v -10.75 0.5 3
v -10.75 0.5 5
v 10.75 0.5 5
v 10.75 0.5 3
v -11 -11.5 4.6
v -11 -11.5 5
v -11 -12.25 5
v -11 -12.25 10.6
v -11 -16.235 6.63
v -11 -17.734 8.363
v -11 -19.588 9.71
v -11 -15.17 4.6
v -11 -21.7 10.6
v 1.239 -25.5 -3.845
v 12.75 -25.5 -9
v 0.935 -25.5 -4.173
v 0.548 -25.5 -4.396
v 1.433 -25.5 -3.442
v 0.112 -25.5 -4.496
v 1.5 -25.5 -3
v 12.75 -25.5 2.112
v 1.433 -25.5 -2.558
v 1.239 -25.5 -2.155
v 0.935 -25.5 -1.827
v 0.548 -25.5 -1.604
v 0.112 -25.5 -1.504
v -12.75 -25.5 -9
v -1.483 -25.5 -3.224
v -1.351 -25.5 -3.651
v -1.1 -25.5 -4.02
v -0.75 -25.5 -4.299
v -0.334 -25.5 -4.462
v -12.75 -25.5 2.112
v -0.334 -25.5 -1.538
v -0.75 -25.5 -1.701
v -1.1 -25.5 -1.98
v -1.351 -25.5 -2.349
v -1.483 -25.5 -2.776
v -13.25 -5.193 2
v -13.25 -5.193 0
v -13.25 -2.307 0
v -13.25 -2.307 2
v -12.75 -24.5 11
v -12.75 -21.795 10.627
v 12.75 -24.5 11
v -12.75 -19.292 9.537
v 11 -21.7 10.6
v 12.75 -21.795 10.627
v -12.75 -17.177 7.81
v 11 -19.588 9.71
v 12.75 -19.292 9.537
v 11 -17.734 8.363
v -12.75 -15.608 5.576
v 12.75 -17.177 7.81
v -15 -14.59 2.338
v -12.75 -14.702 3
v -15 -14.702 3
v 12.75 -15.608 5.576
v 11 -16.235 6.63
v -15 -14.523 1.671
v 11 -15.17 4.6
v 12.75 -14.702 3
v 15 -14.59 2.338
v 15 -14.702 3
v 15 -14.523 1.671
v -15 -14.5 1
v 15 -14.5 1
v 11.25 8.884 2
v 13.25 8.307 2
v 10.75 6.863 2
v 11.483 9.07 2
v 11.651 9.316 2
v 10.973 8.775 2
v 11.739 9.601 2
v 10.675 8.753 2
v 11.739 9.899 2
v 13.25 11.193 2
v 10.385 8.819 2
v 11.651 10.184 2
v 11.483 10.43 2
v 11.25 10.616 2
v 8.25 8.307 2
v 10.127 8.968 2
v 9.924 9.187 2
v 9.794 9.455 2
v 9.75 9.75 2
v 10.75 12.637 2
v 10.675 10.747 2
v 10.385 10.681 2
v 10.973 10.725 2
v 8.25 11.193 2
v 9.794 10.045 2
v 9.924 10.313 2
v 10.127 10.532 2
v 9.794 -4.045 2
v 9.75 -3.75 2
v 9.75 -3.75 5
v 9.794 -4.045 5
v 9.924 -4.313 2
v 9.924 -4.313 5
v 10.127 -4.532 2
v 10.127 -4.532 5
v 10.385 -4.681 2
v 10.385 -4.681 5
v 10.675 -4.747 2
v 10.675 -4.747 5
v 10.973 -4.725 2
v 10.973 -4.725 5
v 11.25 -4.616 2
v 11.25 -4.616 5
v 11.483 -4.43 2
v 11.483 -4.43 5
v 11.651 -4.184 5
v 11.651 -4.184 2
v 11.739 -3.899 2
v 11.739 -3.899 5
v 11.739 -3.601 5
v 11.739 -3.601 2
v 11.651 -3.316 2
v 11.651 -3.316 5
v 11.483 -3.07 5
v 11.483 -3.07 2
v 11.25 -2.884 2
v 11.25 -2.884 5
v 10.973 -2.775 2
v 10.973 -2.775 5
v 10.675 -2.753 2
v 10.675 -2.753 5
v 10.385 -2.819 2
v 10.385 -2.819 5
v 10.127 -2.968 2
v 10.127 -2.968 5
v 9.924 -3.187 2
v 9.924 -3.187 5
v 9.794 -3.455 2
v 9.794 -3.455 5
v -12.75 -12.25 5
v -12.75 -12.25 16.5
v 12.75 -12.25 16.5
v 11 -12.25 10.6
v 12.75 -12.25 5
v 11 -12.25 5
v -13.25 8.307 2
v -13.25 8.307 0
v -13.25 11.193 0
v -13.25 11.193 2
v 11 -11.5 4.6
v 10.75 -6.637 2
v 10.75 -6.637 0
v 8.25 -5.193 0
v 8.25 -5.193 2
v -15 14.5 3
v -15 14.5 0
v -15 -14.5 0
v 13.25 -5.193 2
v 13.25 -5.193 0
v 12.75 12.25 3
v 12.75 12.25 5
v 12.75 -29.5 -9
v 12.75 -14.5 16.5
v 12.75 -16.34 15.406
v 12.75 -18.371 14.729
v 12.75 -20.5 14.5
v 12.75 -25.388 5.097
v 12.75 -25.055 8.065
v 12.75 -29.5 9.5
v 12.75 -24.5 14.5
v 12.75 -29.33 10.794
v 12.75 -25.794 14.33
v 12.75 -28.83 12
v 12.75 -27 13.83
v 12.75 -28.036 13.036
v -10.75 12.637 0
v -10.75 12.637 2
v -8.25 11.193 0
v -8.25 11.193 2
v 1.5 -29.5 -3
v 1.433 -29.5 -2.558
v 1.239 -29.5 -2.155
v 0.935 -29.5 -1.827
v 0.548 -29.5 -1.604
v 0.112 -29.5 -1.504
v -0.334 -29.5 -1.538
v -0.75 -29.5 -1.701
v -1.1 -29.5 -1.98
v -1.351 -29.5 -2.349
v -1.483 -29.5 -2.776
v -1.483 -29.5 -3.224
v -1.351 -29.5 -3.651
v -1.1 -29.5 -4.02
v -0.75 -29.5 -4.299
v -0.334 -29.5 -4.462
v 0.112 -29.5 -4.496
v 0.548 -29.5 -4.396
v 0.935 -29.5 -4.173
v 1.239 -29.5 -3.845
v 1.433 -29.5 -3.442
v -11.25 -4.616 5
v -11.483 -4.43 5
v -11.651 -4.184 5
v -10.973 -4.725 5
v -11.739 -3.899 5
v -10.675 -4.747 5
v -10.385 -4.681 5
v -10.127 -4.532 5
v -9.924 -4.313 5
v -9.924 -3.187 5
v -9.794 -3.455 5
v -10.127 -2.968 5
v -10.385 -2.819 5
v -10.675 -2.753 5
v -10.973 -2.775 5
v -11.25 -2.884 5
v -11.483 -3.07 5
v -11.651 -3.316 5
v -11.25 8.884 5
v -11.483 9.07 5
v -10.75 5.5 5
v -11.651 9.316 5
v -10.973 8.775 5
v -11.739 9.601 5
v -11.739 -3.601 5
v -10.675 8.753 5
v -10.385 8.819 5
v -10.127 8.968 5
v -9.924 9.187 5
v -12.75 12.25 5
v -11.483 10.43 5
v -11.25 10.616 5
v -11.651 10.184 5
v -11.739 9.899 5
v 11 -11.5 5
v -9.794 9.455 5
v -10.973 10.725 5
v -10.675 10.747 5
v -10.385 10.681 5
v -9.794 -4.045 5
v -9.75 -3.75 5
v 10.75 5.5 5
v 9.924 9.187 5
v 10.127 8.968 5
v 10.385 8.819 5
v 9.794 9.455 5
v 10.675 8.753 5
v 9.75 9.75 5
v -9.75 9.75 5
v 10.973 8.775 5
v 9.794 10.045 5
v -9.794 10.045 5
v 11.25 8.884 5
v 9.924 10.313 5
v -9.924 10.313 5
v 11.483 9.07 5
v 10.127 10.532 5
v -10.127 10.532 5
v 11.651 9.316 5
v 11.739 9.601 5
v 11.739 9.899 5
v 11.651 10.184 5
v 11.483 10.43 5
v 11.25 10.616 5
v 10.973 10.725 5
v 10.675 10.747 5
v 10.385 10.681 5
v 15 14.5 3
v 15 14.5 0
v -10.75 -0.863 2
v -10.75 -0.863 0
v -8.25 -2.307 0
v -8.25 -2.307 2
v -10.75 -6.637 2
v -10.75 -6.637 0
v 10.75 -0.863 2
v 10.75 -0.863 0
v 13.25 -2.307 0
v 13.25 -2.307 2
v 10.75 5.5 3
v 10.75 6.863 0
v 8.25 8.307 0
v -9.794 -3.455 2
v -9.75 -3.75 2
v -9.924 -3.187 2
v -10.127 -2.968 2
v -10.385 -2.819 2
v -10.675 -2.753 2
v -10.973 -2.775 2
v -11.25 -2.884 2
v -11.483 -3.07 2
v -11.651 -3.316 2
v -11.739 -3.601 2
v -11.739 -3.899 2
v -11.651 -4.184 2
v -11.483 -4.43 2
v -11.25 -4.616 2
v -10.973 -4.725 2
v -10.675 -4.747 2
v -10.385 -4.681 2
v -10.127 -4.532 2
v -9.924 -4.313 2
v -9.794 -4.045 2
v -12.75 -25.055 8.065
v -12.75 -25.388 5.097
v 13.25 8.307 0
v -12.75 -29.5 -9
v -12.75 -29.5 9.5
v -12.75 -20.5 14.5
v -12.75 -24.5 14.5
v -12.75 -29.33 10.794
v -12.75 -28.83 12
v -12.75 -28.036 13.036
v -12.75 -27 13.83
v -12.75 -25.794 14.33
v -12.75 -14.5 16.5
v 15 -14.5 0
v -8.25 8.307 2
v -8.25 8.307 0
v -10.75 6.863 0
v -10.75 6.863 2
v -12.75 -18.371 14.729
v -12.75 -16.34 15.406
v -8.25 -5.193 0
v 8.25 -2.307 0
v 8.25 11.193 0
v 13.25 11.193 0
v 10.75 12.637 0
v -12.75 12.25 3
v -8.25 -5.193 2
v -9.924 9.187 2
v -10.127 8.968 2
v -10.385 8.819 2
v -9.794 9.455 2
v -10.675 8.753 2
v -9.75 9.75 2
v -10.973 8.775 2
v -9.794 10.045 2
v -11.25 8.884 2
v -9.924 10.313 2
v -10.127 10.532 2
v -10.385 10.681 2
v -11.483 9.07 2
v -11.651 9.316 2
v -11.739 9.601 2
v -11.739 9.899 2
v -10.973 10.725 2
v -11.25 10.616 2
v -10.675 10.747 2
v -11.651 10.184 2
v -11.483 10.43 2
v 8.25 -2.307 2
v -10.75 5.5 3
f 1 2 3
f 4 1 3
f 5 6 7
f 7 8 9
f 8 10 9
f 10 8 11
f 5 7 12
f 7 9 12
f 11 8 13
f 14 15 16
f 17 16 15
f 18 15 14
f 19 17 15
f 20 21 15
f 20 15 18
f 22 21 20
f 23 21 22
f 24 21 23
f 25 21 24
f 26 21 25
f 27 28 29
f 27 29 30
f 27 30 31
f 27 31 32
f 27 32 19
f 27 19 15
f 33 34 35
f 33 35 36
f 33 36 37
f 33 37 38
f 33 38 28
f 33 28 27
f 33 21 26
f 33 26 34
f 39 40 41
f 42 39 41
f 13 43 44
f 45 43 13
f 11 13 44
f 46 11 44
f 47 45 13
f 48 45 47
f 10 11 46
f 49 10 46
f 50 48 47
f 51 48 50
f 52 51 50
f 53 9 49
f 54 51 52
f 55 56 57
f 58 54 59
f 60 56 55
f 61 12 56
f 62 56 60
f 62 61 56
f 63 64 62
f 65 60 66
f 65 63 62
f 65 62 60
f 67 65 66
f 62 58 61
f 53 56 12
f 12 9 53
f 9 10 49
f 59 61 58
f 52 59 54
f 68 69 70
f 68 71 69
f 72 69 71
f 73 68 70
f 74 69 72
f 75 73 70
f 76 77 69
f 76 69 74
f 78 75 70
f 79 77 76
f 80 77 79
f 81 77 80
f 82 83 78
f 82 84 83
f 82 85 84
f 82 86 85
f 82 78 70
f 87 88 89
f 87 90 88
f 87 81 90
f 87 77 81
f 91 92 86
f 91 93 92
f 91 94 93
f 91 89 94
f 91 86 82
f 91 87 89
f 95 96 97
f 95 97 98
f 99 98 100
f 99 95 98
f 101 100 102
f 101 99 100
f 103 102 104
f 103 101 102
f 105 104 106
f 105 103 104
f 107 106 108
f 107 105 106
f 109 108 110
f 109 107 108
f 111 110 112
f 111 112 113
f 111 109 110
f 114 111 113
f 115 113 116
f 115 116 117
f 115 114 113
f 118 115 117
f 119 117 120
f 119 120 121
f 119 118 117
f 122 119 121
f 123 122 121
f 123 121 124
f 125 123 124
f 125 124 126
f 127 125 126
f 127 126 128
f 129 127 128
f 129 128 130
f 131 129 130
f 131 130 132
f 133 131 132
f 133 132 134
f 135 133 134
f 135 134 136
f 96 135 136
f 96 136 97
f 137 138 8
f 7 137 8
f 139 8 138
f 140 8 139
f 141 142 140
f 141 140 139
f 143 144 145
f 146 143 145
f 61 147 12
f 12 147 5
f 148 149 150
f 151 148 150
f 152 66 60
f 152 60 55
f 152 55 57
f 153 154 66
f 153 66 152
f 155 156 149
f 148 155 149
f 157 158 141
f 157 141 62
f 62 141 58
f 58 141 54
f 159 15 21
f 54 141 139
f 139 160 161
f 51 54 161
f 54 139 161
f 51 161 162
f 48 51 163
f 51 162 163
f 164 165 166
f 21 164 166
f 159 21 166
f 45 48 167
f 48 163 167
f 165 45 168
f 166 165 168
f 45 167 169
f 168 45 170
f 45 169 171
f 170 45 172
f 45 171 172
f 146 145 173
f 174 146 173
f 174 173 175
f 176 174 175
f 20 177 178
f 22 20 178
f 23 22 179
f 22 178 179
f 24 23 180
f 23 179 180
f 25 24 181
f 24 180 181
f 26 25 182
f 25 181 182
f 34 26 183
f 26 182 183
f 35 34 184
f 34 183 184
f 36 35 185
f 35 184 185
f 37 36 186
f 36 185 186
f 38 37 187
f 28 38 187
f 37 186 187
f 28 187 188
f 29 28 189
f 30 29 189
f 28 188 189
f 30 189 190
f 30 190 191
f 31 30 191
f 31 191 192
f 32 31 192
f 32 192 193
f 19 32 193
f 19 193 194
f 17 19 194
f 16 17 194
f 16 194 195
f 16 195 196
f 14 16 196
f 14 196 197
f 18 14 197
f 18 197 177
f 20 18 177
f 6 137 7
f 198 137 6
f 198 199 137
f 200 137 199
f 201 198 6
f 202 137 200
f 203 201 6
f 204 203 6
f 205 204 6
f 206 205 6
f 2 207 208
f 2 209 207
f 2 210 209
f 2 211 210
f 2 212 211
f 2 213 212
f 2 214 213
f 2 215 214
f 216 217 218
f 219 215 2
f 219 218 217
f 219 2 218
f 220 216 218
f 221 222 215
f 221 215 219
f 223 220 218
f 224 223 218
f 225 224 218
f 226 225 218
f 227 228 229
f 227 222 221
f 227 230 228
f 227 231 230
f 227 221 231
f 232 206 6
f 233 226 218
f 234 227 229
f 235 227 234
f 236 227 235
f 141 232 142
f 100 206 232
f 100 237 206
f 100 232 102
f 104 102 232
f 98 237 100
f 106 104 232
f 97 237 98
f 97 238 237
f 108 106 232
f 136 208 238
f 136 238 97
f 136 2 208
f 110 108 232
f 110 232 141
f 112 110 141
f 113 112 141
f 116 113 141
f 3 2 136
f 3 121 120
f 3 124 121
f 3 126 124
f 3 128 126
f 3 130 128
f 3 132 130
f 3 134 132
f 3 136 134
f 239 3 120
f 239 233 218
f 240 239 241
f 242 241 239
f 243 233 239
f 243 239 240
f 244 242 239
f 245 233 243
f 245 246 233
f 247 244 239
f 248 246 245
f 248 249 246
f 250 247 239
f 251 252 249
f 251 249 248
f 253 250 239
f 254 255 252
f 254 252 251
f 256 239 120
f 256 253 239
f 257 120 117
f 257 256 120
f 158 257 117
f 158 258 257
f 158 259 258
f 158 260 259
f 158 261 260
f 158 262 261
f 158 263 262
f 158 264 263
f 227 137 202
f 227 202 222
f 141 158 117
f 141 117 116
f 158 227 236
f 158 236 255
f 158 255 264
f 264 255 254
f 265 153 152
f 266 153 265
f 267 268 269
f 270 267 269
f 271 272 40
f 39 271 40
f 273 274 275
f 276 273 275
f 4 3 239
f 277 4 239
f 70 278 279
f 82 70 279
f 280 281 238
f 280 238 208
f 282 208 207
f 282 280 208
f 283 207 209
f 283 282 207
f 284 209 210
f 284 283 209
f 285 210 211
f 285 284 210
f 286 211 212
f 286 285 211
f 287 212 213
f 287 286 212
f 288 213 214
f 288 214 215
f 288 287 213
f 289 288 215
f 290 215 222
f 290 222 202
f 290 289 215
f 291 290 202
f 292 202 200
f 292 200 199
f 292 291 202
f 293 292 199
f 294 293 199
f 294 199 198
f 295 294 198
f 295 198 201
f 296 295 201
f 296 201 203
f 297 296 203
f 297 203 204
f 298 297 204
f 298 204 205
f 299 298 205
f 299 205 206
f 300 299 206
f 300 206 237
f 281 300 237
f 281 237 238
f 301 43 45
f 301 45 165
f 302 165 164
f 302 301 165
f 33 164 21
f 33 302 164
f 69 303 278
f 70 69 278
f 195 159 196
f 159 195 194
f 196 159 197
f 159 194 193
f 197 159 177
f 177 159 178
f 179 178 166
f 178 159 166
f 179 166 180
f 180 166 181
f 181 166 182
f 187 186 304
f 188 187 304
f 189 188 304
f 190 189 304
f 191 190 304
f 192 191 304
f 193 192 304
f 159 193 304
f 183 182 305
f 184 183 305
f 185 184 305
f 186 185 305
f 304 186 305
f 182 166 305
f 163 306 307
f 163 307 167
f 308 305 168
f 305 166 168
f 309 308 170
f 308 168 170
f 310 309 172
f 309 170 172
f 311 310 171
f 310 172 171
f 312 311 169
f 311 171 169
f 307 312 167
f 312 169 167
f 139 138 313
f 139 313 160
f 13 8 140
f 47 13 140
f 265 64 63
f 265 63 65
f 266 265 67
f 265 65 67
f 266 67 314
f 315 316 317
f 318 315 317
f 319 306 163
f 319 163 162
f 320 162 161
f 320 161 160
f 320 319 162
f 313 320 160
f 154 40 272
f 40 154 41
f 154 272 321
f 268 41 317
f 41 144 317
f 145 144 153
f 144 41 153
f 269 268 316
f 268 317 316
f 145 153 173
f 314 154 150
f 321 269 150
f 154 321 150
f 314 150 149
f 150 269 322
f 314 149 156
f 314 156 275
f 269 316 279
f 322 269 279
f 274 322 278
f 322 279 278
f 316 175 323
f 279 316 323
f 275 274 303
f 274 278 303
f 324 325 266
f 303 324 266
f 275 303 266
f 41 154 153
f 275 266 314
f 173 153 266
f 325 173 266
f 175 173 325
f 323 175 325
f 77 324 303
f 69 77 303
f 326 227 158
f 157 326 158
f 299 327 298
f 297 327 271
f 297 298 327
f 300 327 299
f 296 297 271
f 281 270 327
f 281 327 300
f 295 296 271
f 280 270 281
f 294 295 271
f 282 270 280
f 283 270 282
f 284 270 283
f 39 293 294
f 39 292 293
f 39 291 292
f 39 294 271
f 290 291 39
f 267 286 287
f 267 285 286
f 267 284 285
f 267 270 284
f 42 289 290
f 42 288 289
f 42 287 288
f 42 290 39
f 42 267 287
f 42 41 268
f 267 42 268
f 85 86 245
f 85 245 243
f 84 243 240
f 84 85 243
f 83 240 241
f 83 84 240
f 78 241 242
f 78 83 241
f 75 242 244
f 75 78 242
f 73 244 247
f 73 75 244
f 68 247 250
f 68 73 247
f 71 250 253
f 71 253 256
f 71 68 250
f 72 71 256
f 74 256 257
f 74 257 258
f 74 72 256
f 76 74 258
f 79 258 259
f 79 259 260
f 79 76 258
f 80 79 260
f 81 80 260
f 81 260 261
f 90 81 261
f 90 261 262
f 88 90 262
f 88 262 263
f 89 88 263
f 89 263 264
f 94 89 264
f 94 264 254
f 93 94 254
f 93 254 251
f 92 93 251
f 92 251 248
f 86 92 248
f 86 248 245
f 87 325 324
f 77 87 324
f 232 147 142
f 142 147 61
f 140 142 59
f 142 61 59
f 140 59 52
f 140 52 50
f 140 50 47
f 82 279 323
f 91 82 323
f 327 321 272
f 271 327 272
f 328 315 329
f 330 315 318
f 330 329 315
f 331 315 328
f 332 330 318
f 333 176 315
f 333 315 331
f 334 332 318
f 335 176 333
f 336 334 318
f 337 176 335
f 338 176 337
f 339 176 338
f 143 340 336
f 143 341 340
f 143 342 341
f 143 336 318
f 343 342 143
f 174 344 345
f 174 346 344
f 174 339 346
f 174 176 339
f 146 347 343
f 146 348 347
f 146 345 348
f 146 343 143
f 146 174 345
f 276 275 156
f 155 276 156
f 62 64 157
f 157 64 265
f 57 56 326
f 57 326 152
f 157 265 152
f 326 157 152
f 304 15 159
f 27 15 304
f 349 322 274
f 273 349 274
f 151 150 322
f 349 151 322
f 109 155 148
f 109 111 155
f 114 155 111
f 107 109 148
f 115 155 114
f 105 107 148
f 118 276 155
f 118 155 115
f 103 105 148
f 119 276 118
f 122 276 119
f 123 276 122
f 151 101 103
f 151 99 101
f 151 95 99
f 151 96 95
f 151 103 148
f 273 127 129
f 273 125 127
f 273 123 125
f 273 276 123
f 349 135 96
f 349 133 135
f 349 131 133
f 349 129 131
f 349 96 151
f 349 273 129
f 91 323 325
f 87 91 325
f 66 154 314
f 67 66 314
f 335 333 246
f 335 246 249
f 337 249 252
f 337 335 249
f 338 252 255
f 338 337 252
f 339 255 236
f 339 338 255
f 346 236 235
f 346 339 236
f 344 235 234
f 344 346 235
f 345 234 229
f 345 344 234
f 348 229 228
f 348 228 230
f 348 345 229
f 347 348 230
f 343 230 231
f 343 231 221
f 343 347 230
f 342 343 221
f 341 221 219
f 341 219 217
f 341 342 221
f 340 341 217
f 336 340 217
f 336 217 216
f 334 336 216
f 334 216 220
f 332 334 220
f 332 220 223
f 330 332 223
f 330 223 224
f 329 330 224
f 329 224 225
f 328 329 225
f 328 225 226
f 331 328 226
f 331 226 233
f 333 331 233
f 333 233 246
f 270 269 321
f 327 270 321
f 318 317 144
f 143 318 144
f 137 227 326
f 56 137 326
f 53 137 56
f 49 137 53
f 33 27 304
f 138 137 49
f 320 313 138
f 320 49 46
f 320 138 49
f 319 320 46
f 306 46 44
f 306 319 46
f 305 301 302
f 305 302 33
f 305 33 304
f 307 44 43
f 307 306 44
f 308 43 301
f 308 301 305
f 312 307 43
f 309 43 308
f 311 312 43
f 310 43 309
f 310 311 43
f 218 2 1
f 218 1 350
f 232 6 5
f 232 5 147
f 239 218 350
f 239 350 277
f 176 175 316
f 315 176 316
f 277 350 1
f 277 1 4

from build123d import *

# Parameters (mm, degrees)
CROQUIS3_W              = 30
CROQUIS3_H              = 29
SALIENTE_EXTRUIR1_DEPTH = 5
CROQUIS5_W              = 30
CROQUIS5_H              = 29
CROQUIS5_W_2            = 25.5
CROQUIS5_H_2            = 24.5
CORTAR_EXTRUIR1_DEPTH   = 2
CROQUIS9_W              = 25.5
CROQUIS9_H              = 2.25
SALIENTE_EXTRUIR2_DEPTH = 13.5
CROQUIS11_W             = 22
CROQUIS11_H             = 6
CORTAR_EXTRUIR3_DEPTH   = 3
CROQUIS12_W             = 25.5
CROQUIS12_H             = 3.5
SALIENTE_EXTRUIR3_DEPTH = 15
CROQUIS13_W             = 25.5
CROQUIS13_H             = 4
SALIENTE_EXTRUIR4_DEPTH = 20
REDONDEO3_R             = 5
CROQUIS14_R             = 1.5
CORTAR_EXTRUIR4_DEPTH   = 7
REDONDEO5_R             = 10
REDONDEO6_R             = 40
CROQUIS6_R              = 1
CORTAR_EXTRUIR5_DEPTH   = 5
CORTAR_EXTRUIR7_DEPTH   = 2
CROQUIS16_W             = 21.5
CROQUIS16_H             = 5
CORTAR_EXTRUIR8_DEPTH   = 2


with BuildPart() as part:
    # Croquis3 → Saliente-Extruir1 (new body)
    with BuildSketch(Plane.XY):
        Rectangle(CROQUIS3_W, CROQUIS3_H)
    extrude(amount=SALIENTE_EXTRUIR1_DEPTH)

    # Croquis5 → Cortar-Extruir1 (cut)
    with BuildSketch(Plane.XY.offset(5)):
        Rectangle(CROQUIS5_W, CROQUIS5_H)
        Rectangle(CROQUIS5_W_2, CROQUIS5_H_2, mode=Mode.SUBTRACT)
    extrude(amount=-CORTAR_EXTRUIR1_DEPTH, mode=Mode.SUBTRACT)

    # Croquis9 → Saliente-Extruir2 (add)
    with BuildSketch(Plane.XY.offset(3)):
        with Locations((0, -13.375)):
            Rectangle(CROQUIS9_W, CROQUIS9_H)
    extrude(amount=SALIENTE_EXTRUIR2_DEPTH)

    # Croquis11 → Cortar-Extruir3 (cut)
    with BuildSketch(Plane.XZ.offset(14.5)):
        with Locations((0, 7.6)):
            Rectangle(CROQUIS11_W, CROQUIS11_H)
    extrude(amount=-CORTAR_EXTRUIR3_DEPTH, mode=Mode.SUBTRACT)

    # Croquis12 → Saliente-Extruir3 (add)
    with BuildSketch(Plane.XZ.offset(14.5)):
        with Locations((0, 12.75)):
            Rectangle(CROQUIS12_W, CROQUIS12_H)
    extrude(amount=SALIENTE_EXTRUIR3_DEPTH)

    # Croquis13 → Saliente-Extruir4 (add)
    with BuildSketch(Plane(origin=(0, 0, 11), x_dir=(-1, 0, 0), z_dir=(0, 0, -1))):
        with Locations((0, -27.5)):
            Rectangle(CROQUIS13_W, CROQUIS13_H)
    extrude(amount=SALIENTE_EXTRUIR4_DEPTH)

    # Redondeo3
    redondeo3_edges = [part.edges().sort_by_distance(p)[0] for p in [
        (0, -29.5, 14.5),
    ]]
    fillet(redondeo3_edges, radius=REDONDEO3_R)

    # Croquis14 → Cortar-Extruir4 (cut)
    with BuildSketch(Plane.XZ.offset(29.5)):
        with Locations((0, -3)):
            Circle(CROQUIS14_R)
    extrude(amount=-CORTAR_EXTRUIR4_DEPTH, mode=Mode.SUBTRACT)

    # Redondeo5
    # the kernel refuses this fillet: 10 mm, written as the material it adds along each edge
    with BuildSketch(Plane(origin=(12.75, -14.5, 11), x_dir=(0, -1, 0), z_dir=(-1, 0, 0))) as redondeo5_piece_1_section:
        with BuildLine():
            CenterArc((REDONDEO5_R, -REDONDEO5_R), REDONDEO5_R, 90, 90)
            Line((0, -REDONDEO5_R), (0, 0))
            Line((0, 0), (REDONDEO5_R, 0))
        make_face()
    redondeo5_piece_1 = extrude(amount=50.5, mode=Mode.PRIVATE)
    redondeo5_piece_1 = split(redondeo5_piece_1, bisect_by=Plane(origin=(11, -14.5, 11), z_dir=(1, 0, 0)), keep=Keep.TOP, mode=Mode.PRIVATE)
    add(redondeo5_piece_1)
    with BuildSketch(Plane(origin=(37.75, -14.5, 11), x_dir=(0, -1, 0), z_dir=(-1, 0, 0))) as redondeo5_piece_2_section:
        with BuildLine():
            CenterArc((REDONDEO5_R, -REDONDEO5_R), REDONDEO5_R, 90, 90)
            Line((0, -REDONDEO5_R), (0, 0))
            Line((0, 0), (REDONDEO5_R, 0))
        make_face()
    redondeo5_piece_2 = extrude(amount=50.5, mode=Mode.PRIVATE)
    redondeo5_piece_2 = split(redondeo5_piece_2, bisect_by=Plane(origin=(11, -14.5, 11), z_dir=(-1, 0, 0)), keep=Keep.TOP, mode=Mode.PRIVATE)
    redondeo5_piece_2 = split(redondeo5_piece_2, bisect_by=Plane(origin=(37.75, -14.5, 10.6), z_dir=(0, 0, 1)), keep=Keep.TOP, mode=Mode.PRIVATE)
    add(redondeo5_piece_2)
    with BuildSketch(Plane(origin=(37.75, -14.5, 11), x_dir=(0, -1, 0), z_dir=(-1, 0, 0))) as redondeo5_piece_3_section:
        with BuildLine():
            CenterArc((REDONDEO5_R, -REDONDEO5_R), REDONDEO5_R, 90, 90)
            Line((0, -REDONDEO5_R), (0, 0))
            Line((0, 0), (REDONDEO5_R, 0))
        make_face()
    redondeo5_piece_3 = extrude(amount=75.5, mode=Mode.PRIVATE)
    redondeo5_piece_3 = split(redondeo5_piece_3, bisect_by=Plane(origin=(37.75, -14.5, 3), z_dir=(0, 0, -1)), keep=Keep.TOP, mode=Mode.PRIVATE)
    redondeo5_piece_3 = split(redondeo5_piece_3, bisect_by=Plane(origin=(15, -14.5, 11), z_dir=(-1, 0, 0)), keep=Keep.TOP, mode=Mode.PRIVATE)
    redondeo5_piece_3 = split(redondeo5_piece_3, bisect_by=Plane(origin=(-15, -14.5, 11), z_dir=(1, 0, 0)), keep=Keep.TOP, mode=Mode.PRIVATE)
    add(redondeo5_piece_3)
    with BuildSketch(Plane(origin=(37.75, -14.5, 11), x_dir=(0, -1, 0), z_dir=(-1, 0, 0))) as redondeo5_piece_4_section:
        with BuildLine():
            CenterArc((REDONDEO5_R, -REDONDEO5_R), REDONDEO5_R, 90, 90)
            Line((0, -REDONDEO5_R), (0, 0))
            Line((0, 0), (REDONDEO5_R, 0))
        make_face()
    redondeo5_piece_4 = extrude(amount=50.5, mode=Mode.PRIVATE)
    redondeo5_piece_4 = split(redondeo5_piece_4, bisect_by=Plane(origin=(11, -14.5, 11), z_dir=(-1, 0, 0)), keep=Keep.TOP, mode=Mode.PRIVATE)
    redondeo5_piece_4 = split(redondeo5_piece_4, bisect_by=Plane(origin=(37.75, -14.5, 4.6), z_dir=(0, 0, -1)), keep=Keep.TOP, mode=Mode.PRIVATE)
    add(redondeo5_piece_4)
    with BuildSketch(Plane(origin=(37.75, -14.5, 11), x_dir=(0, -1, 0), z_dir=(-1, 0, 0))) as redondeo5_piece_5_section:
        with BuildLine():
            CenterArc((REDONDEO5_R, -REDONDEO5_R), REDONDEO5_R, 90, 90)
            Line((0, -REDONDEO5_R), (0, 0))
            Line((0, 0), (REDONDEO5_R, 0))
        make_face()
    redondeo5_piece_5 = extrude(amount=50.5, mode=Mode.PRIVATE)
    redondeo5_piece_5 = split(redondeo5_piece_5, bisect_by=Plane(origin=(-11, -14.5, 11), z_dir=(-1, 0, 0)), keep=Keep.TOP, mode=Mode.PRIVATE)
    add(redondeo5_piece_5)
    with BuildSketch(Plane(origin=(-12.75, -14.5, 14.5), x_dir=(0, -1, 0), z_dir=(1, 0, 0))) as redondeo5_piece_6:
        with BuildLine():
            CenterArc((6, -10), REDONDEO5_R, 90, 36.869897646)
            Line((0, -2), (0, 0))
            Line((0, 0), (6, 0))
        make_face()
    extrude(amount=25.5)

    # Redondeo6
    # the kernel refuses this fillet: 40 mm, written as the material it adds along each edge
    with BuildSketch(Plane(origin=(-12.75, -25.5, 11), x_dir=(0, 1, 0), z_dir=(1, 0, 0))) as redondeo6_piece_1:
        with BuildLine():
            CenterArc((40, -8.888194417), REDONDEO6_R, 167.161431859, 12.838568141)
            Line((0, -8.888194417), (-0.8, -8.888194417))
            Line((-0.8, -8.888194417), (-0.8, 0))
            Line((-0.8, 0), (0, 0.8))
            ThreePointArc((0, 0.8), (0.5, 0.8), (0.22, 0.177763888))
            Line((0.22, 0.177763888), (1, 0))
        make_face()
    extrude(amount=25.5)

    # Croquis6 → Cortar-Extruir5 (cut)
    with BuildSketch(Plane.XY):
        with Locations((-10.75, 9.75)):
            Circle(CROQUIS6_R)
        with Locations((-10.75, -3.75)):
            Circle(CROQUIS6_R)
        with Locations(Location((10.75, -3.75, 0), (0, 0, 180))):
            Circle(CROQUIS6_R)
        with Locations(Location((10.75, 9.75, 0), (0, 0, 180))):
            Circle(CROQUIS6_R)
    extrude(amount=CORTAR_EXTRUIR5_DEPTH, mode=Mode.SUBTRACT)

    # Croquis15 → Cortar-Extruir7 (cut)
    with BuildSketch(Plane(origin=(0, 0, 0), x_dir=(-1, 0, 0), z_dir=(0, 0, -1))):
        Polygon((-10.75, 12.636751346), (-13.25, 11.193375673), (-13.25, 8.306624327), (-10.75, 6.863248654), (-8.25, 8.306624327), (-8.25, 11.193375673), align=None)
        Polygon((10.75, 12.636751346), (8.25, 11.193375673), (8.25, 8.306624327), (10.75, 6.863248654), (13.25, 8.306624327), (13.25, 11.193375673), align=None)
        Polygon((10.75, -0.863248654), (8.25, -2.306624327), (8.25, -5.193375673), (10.75, -6.636751346), (13.25, -5.193375673), (13.25, -2.306624327), align=None)
        Polygon((-10.75, -0.863248654), (-13.25, -2.306624327), (-13.25, -5.193375673), (-10.75, -6.636751346), (-8.25, -5.193375673), (-8.25, -2.306624327), align=None)
    extrude(amount=-CORTAR_EXTRUIR7_DEPTH, mode=Mode.SUBTRACT)

    # Croquis16 → Cortar-Extruir8 (cut)
    with BuildSketch(Plane.XY.offset(5)):
        with Locations((0, 3)):
            Rectangle(CROQUIS16_W, CROQUIS16_H)
    extrude(amount=-CORTAR_EXTRUIR8_DEPTH, mode=Mode.SUBTRACT)


solid = part.part
